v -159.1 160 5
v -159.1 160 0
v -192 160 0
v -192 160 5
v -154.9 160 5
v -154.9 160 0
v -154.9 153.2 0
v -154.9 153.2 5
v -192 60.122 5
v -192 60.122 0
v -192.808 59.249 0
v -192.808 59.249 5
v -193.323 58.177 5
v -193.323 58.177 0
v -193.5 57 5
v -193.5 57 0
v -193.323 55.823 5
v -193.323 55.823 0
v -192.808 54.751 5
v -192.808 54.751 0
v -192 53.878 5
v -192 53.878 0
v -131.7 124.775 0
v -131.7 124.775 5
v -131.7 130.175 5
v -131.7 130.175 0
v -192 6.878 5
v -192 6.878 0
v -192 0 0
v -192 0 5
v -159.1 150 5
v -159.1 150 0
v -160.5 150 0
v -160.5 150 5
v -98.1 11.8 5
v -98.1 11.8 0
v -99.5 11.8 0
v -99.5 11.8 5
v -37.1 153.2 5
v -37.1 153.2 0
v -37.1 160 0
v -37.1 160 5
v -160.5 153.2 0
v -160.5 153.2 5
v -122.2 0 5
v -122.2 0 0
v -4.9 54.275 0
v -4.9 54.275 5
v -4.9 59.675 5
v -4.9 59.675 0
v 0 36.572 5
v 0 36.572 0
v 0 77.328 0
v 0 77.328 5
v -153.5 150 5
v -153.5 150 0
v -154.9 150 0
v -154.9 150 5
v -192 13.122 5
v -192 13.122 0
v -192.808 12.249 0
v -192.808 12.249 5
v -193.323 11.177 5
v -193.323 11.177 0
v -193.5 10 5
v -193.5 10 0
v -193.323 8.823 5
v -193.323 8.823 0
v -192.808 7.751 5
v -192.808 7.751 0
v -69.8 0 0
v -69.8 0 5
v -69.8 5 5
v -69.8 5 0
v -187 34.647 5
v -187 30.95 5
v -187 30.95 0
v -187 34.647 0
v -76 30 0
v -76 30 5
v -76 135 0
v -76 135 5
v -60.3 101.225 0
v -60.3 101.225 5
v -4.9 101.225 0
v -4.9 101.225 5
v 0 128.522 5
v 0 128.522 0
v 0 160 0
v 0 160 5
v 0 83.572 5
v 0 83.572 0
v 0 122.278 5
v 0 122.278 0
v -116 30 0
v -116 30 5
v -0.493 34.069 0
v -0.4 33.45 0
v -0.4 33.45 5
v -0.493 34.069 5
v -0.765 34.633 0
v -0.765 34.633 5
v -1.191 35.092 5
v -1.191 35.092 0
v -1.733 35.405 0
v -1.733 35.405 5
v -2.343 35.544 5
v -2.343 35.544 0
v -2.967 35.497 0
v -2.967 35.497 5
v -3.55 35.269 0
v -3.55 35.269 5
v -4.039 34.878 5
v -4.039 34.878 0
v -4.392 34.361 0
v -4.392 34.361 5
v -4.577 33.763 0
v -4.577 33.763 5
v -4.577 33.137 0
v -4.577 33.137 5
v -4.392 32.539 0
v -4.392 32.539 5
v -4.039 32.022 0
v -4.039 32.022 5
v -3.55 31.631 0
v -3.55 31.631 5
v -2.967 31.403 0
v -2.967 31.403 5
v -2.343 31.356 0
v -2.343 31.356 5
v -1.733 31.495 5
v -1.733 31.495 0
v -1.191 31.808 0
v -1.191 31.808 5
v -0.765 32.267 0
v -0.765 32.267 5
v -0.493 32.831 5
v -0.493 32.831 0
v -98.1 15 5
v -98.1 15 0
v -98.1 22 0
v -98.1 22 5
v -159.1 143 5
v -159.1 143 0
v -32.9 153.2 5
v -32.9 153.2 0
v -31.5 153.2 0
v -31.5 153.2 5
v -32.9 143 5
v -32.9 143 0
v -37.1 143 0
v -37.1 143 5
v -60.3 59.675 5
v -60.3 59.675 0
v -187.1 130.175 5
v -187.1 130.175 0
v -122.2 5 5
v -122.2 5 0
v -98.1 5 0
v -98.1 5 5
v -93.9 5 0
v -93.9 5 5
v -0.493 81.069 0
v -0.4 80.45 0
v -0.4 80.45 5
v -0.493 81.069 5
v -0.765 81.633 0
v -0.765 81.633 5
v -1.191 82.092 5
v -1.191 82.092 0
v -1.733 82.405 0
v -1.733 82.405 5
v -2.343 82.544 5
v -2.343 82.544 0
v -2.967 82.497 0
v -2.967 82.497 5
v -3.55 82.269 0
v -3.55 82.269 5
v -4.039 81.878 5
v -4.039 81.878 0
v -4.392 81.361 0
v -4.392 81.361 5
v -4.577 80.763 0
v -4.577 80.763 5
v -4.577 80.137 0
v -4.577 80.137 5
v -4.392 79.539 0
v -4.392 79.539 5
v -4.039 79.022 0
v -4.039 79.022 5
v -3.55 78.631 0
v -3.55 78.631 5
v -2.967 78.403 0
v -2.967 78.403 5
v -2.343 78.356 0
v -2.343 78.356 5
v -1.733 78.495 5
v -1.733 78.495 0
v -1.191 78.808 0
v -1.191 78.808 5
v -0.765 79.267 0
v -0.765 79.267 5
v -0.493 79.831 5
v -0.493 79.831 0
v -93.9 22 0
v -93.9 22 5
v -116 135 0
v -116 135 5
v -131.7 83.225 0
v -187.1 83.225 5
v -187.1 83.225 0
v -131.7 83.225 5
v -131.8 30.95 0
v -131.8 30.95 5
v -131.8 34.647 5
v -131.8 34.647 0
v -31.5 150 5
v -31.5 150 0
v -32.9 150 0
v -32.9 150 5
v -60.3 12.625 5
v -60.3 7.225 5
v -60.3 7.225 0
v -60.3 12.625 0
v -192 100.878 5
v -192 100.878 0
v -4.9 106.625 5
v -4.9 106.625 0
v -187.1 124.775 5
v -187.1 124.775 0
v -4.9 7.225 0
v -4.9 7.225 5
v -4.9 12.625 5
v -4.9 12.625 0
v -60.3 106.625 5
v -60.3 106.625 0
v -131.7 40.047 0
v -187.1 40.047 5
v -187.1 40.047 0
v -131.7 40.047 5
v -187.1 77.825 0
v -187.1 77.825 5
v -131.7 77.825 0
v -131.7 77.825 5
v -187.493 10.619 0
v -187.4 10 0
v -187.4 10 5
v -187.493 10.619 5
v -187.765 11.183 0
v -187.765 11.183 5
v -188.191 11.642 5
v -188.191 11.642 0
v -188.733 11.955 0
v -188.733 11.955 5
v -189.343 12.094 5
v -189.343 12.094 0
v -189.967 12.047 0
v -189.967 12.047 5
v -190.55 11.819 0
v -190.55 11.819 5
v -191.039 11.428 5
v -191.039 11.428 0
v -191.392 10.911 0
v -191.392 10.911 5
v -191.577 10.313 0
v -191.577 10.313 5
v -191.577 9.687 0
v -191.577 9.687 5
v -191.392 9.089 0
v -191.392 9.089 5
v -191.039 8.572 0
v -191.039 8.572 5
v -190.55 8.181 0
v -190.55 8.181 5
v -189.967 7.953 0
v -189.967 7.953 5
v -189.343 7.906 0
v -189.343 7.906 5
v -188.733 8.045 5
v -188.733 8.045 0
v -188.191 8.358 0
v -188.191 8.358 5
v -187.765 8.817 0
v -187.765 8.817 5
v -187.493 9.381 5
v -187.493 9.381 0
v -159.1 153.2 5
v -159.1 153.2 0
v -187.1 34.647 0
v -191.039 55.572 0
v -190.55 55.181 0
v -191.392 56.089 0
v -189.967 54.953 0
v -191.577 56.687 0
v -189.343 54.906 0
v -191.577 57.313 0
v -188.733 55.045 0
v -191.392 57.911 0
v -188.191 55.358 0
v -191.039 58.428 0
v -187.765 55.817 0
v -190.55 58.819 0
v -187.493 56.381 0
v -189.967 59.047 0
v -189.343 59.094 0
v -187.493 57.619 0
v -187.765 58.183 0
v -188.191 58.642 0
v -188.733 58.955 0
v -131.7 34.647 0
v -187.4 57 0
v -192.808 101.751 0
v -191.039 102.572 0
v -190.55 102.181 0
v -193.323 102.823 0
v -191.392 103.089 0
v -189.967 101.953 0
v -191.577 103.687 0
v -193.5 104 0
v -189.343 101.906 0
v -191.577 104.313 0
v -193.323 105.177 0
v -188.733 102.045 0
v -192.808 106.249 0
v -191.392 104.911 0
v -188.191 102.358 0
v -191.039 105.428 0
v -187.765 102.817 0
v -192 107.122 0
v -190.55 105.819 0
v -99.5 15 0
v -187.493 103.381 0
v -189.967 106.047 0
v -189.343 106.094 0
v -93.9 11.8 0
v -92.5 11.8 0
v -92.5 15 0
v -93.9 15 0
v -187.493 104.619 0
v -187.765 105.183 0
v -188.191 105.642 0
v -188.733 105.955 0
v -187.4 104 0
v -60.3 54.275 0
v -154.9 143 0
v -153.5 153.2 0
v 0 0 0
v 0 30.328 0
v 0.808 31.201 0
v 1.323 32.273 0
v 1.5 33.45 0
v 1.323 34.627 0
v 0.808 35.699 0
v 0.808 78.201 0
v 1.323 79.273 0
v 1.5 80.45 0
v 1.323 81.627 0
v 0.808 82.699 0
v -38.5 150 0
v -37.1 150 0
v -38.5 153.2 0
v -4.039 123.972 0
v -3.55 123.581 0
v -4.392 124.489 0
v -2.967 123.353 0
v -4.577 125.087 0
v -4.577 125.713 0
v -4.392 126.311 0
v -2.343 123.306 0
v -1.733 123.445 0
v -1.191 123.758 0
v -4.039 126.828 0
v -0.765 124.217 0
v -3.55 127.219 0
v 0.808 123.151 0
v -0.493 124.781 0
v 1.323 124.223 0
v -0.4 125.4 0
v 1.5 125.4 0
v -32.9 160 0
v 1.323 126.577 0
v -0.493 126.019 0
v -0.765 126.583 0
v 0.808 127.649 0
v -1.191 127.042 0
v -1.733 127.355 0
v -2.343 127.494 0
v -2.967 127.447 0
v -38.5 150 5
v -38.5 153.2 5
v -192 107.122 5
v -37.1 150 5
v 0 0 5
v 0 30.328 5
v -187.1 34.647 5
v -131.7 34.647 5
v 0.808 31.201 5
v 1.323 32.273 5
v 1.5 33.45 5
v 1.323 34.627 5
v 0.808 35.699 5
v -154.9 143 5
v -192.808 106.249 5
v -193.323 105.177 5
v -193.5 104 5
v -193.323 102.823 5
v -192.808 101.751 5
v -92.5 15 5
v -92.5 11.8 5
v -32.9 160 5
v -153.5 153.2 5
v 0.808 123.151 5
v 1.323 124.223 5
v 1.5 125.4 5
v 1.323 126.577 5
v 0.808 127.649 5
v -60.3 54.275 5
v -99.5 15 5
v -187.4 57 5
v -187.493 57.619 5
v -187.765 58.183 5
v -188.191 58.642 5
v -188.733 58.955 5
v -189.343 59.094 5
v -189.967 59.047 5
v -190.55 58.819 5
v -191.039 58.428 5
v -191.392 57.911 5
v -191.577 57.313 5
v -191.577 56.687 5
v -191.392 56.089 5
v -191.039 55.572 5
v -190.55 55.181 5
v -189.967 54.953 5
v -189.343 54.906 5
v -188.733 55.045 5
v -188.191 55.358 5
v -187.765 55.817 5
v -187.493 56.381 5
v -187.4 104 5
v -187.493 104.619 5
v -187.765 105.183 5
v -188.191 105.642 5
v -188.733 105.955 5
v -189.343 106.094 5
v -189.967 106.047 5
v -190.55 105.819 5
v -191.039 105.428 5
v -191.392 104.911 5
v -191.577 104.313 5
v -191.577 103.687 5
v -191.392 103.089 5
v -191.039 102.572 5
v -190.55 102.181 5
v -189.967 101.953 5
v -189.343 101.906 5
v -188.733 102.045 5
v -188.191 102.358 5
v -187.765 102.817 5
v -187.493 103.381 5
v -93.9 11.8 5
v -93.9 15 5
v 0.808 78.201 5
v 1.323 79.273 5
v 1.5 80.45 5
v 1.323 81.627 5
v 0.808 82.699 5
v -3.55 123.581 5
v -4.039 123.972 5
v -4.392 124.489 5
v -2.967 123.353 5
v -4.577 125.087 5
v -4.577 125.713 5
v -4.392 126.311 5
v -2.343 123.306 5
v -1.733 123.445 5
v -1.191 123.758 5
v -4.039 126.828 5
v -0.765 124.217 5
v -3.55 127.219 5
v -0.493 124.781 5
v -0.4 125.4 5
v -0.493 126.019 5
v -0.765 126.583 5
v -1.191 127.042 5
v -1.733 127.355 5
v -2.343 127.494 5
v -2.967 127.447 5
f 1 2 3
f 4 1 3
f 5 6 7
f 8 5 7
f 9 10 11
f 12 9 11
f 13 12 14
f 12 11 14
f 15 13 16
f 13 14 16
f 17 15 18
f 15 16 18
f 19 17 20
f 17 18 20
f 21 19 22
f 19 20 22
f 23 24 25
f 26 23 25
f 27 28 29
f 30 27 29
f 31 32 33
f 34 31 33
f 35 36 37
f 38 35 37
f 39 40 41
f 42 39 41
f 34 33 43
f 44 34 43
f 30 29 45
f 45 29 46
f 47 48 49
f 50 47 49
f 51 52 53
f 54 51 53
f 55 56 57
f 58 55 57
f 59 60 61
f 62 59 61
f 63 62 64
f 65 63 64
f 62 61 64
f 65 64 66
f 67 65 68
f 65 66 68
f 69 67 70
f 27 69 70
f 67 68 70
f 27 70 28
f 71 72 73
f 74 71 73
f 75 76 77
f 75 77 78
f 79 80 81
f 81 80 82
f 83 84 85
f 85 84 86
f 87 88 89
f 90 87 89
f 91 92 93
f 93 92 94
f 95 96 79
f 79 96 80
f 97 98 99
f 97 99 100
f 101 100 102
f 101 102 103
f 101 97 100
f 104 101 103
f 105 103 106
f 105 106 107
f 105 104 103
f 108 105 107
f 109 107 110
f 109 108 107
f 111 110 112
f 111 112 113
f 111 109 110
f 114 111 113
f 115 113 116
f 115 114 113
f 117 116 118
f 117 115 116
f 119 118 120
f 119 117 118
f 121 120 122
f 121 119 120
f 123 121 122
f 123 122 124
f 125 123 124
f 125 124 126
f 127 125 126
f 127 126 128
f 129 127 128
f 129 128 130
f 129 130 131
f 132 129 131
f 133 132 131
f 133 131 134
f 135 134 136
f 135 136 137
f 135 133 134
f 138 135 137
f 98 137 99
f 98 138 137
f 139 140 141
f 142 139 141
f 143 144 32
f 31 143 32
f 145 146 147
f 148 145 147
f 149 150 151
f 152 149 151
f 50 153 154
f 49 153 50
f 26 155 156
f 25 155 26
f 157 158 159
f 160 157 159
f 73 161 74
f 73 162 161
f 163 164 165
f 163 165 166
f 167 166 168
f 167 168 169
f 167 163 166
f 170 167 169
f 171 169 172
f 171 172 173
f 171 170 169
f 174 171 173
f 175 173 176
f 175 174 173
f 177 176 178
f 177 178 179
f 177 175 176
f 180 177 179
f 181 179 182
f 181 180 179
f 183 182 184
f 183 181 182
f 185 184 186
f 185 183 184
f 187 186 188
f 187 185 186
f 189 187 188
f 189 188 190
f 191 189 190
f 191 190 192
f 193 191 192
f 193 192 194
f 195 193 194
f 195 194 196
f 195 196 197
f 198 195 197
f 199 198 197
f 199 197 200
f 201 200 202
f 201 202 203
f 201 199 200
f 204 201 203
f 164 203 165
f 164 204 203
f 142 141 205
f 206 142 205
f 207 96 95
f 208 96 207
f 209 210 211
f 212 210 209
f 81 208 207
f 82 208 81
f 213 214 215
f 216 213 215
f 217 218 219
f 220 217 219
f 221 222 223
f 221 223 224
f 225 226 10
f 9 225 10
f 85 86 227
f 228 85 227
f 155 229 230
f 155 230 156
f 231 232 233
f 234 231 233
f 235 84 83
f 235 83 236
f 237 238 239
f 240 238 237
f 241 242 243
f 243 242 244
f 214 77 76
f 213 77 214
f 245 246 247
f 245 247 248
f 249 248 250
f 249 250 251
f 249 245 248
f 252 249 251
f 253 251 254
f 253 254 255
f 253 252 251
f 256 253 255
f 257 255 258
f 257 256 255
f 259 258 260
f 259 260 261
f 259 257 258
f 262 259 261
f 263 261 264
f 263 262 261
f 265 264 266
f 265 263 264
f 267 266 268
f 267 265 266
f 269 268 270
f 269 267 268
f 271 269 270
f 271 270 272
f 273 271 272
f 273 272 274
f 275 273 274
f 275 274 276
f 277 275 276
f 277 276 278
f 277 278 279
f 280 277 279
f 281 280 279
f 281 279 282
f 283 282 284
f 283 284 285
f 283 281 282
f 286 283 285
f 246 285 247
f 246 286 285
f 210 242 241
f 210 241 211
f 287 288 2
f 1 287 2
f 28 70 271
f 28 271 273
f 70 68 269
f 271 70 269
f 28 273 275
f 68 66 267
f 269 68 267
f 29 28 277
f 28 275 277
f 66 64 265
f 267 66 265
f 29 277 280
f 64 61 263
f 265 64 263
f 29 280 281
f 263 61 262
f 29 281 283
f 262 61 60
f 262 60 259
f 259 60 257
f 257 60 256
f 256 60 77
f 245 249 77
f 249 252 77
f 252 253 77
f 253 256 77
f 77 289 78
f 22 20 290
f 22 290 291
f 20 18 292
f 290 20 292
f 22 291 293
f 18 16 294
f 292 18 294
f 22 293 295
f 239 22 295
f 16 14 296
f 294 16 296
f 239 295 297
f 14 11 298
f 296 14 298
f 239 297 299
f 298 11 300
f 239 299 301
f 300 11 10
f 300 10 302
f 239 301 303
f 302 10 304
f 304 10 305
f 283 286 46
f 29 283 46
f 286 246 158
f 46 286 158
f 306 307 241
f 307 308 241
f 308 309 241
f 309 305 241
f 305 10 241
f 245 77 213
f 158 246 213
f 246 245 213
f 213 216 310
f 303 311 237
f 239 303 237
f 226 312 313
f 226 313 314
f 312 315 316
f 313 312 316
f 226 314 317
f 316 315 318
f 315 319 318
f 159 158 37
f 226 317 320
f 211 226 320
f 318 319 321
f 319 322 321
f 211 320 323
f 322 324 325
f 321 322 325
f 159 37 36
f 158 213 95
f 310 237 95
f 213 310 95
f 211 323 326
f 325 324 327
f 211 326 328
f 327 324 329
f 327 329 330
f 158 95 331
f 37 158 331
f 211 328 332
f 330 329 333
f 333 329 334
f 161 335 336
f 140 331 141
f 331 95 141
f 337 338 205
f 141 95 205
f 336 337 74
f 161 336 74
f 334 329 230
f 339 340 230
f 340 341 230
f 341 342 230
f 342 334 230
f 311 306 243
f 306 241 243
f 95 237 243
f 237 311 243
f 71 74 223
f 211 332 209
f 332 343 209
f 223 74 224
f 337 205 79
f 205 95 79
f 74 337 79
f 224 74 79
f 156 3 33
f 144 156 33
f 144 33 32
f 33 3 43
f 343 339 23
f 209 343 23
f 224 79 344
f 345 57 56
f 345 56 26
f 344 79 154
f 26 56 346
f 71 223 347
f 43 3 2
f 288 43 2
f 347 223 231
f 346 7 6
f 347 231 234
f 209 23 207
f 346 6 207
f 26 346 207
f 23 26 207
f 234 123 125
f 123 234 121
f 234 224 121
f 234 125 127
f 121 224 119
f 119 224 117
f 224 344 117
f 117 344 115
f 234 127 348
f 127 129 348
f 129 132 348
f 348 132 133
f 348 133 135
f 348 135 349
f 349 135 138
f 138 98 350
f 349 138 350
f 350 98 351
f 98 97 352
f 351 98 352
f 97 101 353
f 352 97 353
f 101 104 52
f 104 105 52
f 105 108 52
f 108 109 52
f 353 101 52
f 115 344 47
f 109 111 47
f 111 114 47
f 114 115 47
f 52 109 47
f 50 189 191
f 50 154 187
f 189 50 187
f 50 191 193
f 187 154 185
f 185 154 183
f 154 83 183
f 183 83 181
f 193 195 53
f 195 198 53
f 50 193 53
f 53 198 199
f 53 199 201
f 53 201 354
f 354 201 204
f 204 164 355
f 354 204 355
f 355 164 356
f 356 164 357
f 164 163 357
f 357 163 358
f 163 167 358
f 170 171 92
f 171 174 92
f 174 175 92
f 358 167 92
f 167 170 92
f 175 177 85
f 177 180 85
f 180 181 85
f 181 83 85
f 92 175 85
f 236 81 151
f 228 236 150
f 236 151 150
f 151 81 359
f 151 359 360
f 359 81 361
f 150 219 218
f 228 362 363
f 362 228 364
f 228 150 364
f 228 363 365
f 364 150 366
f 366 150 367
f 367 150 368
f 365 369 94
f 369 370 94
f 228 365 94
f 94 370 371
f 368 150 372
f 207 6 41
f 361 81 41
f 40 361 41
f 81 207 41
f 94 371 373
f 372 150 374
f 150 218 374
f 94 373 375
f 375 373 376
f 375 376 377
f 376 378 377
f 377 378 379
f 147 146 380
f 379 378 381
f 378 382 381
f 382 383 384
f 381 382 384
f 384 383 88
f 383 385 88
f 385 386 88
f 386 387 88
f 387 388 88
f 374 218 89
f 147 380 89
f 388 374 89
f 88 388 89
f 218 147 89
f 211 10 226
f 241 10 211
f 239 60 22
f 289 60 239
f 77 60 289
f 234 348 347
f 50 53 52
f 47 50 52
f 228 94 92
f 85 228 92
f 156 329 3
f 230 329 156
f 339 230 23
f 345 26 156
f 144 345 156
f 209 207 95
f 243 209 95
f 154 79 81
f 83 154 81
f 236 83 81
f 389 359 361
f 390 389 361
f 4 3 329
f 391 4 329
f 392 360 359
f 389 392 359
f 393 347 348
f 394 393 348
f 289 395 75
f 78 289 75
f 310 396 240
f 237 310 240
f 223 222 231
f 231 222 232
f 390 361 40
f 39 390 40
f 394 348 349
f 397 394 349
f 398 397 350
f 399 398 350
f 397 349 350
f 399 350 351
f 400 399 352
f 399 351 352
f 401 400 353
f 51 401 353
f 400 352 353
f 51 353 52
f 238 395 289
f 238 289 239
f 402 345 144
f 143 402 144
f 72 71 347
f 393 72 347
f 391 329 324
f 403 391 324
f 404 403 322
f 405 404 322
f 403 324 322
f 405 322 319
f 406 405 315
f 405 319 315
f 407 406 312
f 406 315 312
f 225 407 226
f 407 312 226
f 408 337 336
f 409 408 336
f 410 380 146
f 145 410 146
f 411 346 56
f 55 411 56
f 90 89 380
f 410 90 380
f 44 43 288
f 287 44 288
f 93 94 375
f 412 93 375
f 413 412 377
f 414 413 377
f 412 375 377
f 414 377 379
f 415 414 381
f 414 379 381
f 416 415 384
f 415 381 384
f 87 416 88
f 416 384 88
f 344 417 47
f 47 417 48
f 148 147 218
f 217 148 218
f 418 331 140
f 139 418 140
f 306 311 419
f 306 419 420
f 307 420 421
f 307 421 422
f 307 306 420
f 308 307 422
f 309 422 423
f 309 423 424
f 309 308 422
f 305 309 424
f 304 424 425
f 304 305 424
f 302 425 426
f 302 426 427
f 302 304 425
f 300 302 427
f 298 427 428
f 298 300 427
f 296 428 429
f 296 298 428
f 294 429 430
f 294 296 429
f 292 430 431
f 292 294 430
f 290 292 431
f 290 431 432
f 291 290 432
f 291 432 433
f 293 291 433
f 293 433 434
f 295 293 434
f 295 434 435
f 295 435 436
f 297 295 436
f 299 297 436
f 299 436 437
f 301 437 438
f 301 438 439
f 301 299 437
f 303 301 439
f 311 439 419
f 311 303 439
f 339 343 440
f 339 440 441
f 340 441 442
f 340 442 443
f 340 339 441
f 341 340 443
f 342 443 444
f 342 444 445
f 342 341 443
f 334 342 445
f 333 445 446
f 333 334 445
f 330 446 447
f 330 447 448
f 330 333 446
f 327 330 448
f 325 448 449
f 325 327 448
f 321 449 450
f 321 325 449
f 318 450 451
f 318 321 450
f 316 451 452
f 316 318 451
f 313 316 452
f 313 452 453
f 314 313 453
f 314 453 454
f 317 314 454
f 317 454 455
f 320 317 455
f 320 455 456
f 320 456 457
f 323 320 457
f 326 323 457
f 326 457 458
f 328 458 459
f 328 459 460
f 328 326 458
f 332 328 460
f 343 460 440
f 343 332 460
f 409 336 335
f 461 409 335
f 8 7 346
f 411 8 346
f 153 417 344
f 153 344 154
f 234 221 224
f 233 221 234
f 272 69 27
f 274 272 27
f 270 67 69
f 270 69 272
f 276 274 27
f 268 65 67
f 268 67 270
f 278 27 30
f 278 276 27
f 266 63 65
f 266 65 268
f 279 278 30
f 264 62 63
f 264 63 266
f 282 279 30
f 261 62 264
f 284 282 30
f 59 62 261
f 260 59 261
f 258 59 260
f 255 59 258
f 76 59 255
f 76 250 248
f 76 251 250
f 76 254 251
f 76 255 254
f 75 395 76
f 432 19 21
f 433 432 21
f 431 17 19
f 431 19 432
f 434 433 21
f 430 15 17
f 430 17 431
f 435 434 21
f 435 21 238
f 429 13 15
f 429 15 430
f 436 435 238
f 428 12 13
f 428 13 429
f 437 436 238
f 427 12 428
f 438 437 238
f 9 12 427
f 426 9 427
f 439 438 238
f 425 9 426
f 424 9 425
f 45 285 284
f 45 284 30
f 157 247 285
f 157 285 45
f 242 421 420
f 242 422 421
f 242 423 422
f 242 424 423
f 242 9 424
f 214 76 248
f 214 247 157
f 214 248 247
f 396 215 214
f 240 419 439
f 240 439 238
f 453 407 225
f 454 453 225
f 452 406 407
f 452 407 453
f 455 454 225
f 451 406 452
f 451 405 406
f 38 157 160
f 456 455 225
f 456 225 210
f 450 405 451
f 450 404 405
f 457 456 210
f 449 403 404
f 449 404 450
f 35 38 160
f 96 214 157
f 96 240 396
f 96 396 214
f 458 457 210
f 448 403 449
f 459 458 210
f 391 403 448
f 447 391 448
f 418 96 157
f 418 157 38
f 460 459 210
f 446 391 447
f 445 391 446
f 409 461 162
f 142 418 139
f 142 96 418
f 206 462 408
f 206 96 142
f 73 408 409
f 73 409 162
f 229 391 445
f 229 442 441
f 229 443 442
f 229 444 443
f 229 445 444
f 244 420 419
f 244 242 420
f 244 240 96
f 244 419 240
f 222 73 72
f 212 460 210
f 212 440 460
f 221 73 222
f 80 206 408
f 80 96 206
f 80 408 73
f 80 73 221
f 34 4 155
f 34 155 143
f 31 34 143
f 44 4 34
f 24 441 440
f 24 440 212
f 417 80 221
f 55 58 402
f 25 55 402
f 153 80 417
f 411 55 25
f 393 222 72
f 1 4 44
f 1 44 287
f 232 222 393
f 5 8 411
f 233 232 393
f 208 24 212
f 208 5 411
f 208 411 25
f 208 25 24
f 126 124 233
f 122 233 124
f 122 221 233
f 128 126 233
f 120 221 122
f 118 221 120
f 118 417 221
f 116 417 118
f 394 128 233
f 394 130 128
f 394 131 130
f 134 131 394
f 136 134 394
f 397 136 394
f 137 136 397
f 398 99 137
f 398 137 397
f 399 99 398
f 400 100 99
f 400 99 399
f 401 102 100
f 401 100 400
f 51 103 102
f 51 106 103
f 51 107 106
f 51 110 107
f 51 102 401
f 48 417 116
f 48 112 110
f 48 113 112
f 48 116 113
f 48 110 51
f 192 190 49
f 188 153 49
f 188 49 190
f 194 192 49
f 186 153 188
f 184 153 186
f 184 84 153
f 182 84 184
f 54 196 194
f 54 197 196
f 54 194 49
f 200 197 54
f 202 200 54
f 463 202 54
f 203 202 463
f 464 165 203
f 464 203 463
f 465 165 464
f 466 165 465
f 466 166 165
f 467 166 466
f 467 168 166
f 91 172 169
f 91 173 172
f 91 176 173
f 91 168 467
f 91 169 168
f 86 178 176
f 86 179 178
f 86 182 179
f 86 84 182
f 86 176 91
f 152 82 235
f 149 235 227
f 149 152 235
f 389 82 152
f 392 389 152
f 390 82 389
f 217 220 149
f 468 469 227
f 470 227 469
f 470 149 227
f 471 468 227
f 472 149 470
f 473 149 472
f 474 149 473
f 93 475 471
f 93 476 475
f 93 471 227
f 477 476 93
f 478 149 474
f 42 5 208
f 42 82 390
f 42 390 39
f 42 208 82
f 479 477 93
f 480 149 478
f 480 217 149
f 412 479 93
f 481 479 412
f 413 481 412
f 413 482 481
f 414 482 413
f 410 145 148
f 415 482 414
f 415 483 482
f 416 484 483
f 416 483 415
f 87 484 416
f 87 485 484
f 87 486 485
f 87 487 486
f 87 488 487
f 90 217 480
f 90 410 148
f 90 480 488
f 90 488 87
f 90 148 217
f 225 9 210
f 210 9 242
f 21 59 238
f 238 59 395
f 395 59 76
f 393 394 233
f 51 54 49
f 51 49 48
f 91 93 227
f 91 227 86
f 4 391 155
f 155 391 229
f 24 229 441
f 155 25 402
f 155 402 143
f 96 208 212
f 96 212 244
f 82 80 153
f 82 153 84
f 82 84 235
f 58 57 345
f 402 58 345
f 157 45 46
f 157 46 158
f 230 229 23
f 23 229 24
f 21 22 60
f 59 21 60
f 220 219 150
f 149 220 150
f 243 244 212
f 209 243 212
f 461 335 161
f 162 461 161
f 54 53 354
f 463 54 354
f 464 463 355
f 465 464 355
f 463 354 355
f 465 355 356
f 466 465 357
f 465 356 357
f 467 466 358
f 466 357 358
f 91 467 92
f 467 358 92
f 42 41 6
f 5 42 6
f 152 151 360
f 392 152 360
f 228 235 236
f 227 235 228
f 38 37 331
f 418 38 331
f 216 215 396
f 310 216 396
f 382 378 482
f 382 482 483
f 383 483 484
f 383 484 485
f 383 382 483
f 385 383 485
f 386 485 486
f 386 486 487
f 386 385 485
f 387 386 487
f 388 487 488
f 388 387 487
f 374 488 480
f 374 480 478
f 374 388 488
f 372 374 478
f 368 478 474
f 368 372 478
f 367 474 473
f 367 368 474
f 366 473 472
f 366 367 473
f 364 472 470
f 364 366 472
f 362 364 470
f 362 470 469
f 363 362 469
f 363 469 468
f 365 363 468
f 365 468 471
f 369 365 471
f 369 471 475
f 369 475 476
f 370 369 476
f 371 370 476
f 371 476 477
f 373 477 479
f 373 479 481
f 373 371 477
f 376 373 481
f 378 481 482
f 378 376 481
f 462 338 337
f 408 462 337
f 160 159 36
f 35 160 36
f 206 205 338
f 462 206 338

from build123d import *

# Parameters (mm, degrees)
SKETCH1_R           = 2.1
SKETCH1_W           = 55.2
SKETCH1_H           = 5.05
BOSS_EXTRUDE1_DEPTH = 5
SKETCH2_W           = 55.4
SKETCH2_H           = 5.4
CUT_EXTRUDE1_DEPTH  = 10
SKETCH3_W           = 52.4
SKETCH3_H           = 5
CUT_EXTRUDE2_DEPTH  = 10
SKETCH4_W           = 40
SKETCH4_H           = 105
CUT_EXTRUDE3_DEPTH  = 10


with BuildPart() as part:
    # Sketch1 → Boss-Extrude1 (new body)
    with BuildSketch(Plane.XY):
        with BuildLine():
            Line((-192, 100.877501001), (-192, 60.122498999))
            ThreePointArc((-192, 60.122498999), (-193.5, 57), (-192, 53.877501001))
            Line((-192, 53.877501001), (-192, 13.122498999))
            ThreePointArc((-192, 13.122498999), (-193.5, 10), (-192, 6.877501001))
            Line((-192, 6.877501001), (-192, 0))
            Line((-192, 0), (-122, 0))
            Line((-122, 0), (-122, 5))
            Line((-122, 5), (-98.1, 5))
            Line((-98.1, 5), (-98.1, 11.8))
            Line((-98.1, 11.8), (-99.5, 11.8))
            Line((-99.5, 11.8), (-99.5, 15))
            Line((-99.5, 15), (-98.1, 15))
            Line((-98.1, 15), (-98.1, 22))
            Line((-98.1, 22), (-93.9, 22))
            Line((-93.9, 22), (-93.9, 15))
            Line((-93.9, 15), (-92.5, 15))
            Line((-92.5, 15), (-92.5, 11.8))
            Line((-92.5, 11.8), (-93.9, 11.8))
            Line((-93.9, 11.8), (-93.9, 5))
            Line((-93.9, 5), (-70, 5))
            Line((-70, 5), (-70, 0))
            Line((-70, 0), (0, 0))
            Line((0, 0), (0, 30.327501001))
            ThreePointArc((0, 30.327501001), (1.5, 33.45), (0, 36.572498999))
            Line((0, 36.572498999), (0, 77.327501001))
            ThreePointArc((0, 77.327501001), (1.5, 80.45), (0, 83.572498999))
            Line((0, 83.572498999), (0, 122.277501001))
            ThreePointArc((0, 122.277501001), (1.5, 125.4), (0, 128.522498999))
            Line((0, 128.522498999), (0, 160))
            Line((0, 160), (-32.9, 160))
            Line((-32.9, 160), (-32.9, 153.2))
            Line((-32.9, 153.2), (-31.5, 153.2))
            Line((-31.5, 153.2), (-31.5, 150))
            Line((-31.5, 150), (-32.9, 150))
            Line((-32.9, 150), (-32.9, 143))
            Line((-32.9, 143), (-37.1, 143))
            Line((-37.1, 143), (-37.1, 150))
            Line((-37.1, 150), (-38.5, 150))
            Line((-38.5, 150), (-38.5, 153.2))
            Line((-38.5, 153.2), (-37.1, 153.2))
            Line((-37.1, 153.2), (-37.1, 160))
            Line((-37.1, 160), (-154.9, 160))
            Line((-154.9, 160), (-154.9, 153.2))
            Line((-154.9, 153.2), (-153.5, 153.2))
            Line((-153.5, 153.2), (-153.5, 150))
            Line((-153.5, 150), (-154.9, 150))
            Line((-154.9, 150), (-154.9, 143))
            Line((-154.9, 143), (-159.1, 143))
            Line((-159.1, 143), (-159.1, 150))
            Line((-159.1, 150), (-160.5, 150))
            Line((-160.5, 150), (-160.5, 153.2))
            Line((-160.5, 153.2), (-159.1, 153.2))
            Line((-159.1, 153.2), (-159.1, 160))
            Line((-159.1, 160), (-192, 160))
            Line((-192, 160), (-192, 107.122498999))
            ThreePointArc((-192, 107.122498999), (-193.5, 104), (-192, 100.877501001))
        make_face()
        with Locations((-189.5, 104)):
            Circle(SKETCH1_R, mode=Mode.SUBTRACT)
        with Locations((-189.5, 57)):
            Circle(SKETCH1_R, mode=Mode.SUBTRACT)
        with Locations((-189.5, 10)):
            Circle(SKETCH1_R, mode=Mode.SUBTRACT)
        with Locations((-2.5, 125.4)):
            Circle(SKETCH1_R, mode=Mode.SUBTRACT)
        with Locations((-2.5, 80.45)):
            Circle(SKETCH1_R, mode=Mode.SUBTRACT)
        with Locations((-2.5, 33.45)):
            Circle(SKETCH1_R, mode=Mode.SUBTRACT)
        with Locations((-159.4, 127.475)):
            Rectangle(SKETCH1_W, SKETCH1_H, mode=Mode.SUBTRACT)
        with Locations((-159.4, 80.475)):
            Rectangle(SKETCH1_W, SKETCH1_H, mode=Mode.SUBTRACT)
        with Locations((-159.4, 33.475)):
            Rectangle(SKETCH1_W, SKETCH1_H, mode=Mode.SUBTRACT)
        with Locations((-32.6, 103.925)):
            Rectangle(SKETCH1_W, SKETCH1_H, mode=Mode.SUBTRACT)
        with Locations((-32.6, 56.925)):
            Rectangle(SKETCH1_W, SKETCH1_H, mode=Mode.SUBTRACT)
        with Locations((-32.6, 9.925)):
            Rectangle(SKETCH1_W, SKETCH1_H, mode=Mode.SUBTRACT)
    extrude(amount=BOSS_EXTRUDE1_DEPTH)

    # Sketch2 → Cut-Extrude1 (cut)
    with BuildSketch(Plane.XY.offset(5)):
        with Locations((-159.4, 127.475)):
            Rectangle(SKETCH2_W, SKETCH2_H)
        with Locations((-32.6, 103.925)):
            Rectangle(SKETCH2_W, SKETCH2_H)
        with Locations((-159.4, 80.525)):
            Rectangle(SKETCH2_W, SKETCH2_H)
        with Locations((-159.4, 37.347324844)):
            Rectangle(SKETCH2_W, SKETCH2_H)
        with Locations((-32.6, 56.975)):
            Rectangle(SKETCH2_W, SKETCH2_H)
        with Locations((-32.6, 9.925)):
            Rectangle(SKETCH2_W, SKETCH2_H)
    extrude(amount=-CUT_EXTRUDE1_DEPTH, mode=Mode.SUBTRACT)

    # Sketch3 → Cut-Extrude2 (cut)
    with BuildSketch(Plane.XY.offset(5)):
        with Locations((-96, 2.5)):
            Rectangle(SKETCH3_W, SKETCH3_H)
    extrude(amount=-CUT_EXTRUDE2_DEPTH, mode=Mode.SUBTRACT)

    # Sketch4 → Cut-Extrude3 (cut)
    with BuildSketch(Plane.XY.offset(5)):
        with Locations((-96, 82.5)):
            Rectangle(SKETCH4_W, SKETCH4_H)
    extrude(amount=-CUT_EXTRUDE3_DEPTH, mode=Mode.SUBTRACT)


solid = part.part
